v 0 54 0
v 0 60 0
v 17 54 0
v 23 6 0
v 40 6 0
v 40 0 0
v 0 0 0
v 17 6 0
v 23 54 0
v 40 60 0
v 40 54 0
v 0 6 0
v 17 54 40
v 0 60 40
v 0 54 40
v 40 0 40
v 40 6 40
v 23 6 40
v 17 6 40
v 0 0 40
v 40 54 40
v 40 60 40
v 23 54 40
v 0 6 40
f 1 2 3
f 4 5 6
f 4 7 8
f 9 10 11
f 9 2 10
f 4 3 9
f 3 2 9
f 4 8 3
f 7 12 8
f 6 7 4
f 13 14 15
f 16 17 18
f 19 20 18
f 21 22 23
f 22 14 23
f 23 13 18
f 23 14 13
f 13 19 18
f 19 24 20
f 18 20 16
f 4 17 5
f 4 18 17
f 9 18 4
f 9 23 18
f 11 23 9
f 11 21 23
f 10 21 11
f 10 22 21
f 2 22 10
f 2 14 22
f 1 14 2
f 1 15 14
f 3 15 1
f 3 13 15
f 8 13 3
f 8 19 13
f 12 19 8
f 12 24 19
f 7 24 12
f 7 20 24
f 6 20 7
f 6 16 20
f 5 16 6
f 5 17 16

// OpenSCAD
$fn = 32;

// ----------------------------------------------------------------------
// Structural section: ibeam 40 x 60 mm
// ----------------------------------------------------------------------

// --- parameters (mm) ---
sec_w = 40;               // section width, X
sec_h = 60;               // section height, Y
flange_t = 6;             // flange thickness
web_t = 6;                // web thickness
plate_t = 40;             // cut length, Z (extrusion height)
fit_tol = 0.05;           // declared fit tolerance (prompt contract)
free_tol = 0.2;           // declared free tolerance (prompt contract)

profile = [[0, 0], [40, 0], [40, 6], [23, 6], [23, 54], [40, 54], [40, 60], [0, 60], [0, 54], [17, 54], [17, 6], [0, 6]];  // primary outline, 12 points, counter clockwise

// --- the one profile operation ---
linear_extrude(height = plate_t) polygon(points = profile);
